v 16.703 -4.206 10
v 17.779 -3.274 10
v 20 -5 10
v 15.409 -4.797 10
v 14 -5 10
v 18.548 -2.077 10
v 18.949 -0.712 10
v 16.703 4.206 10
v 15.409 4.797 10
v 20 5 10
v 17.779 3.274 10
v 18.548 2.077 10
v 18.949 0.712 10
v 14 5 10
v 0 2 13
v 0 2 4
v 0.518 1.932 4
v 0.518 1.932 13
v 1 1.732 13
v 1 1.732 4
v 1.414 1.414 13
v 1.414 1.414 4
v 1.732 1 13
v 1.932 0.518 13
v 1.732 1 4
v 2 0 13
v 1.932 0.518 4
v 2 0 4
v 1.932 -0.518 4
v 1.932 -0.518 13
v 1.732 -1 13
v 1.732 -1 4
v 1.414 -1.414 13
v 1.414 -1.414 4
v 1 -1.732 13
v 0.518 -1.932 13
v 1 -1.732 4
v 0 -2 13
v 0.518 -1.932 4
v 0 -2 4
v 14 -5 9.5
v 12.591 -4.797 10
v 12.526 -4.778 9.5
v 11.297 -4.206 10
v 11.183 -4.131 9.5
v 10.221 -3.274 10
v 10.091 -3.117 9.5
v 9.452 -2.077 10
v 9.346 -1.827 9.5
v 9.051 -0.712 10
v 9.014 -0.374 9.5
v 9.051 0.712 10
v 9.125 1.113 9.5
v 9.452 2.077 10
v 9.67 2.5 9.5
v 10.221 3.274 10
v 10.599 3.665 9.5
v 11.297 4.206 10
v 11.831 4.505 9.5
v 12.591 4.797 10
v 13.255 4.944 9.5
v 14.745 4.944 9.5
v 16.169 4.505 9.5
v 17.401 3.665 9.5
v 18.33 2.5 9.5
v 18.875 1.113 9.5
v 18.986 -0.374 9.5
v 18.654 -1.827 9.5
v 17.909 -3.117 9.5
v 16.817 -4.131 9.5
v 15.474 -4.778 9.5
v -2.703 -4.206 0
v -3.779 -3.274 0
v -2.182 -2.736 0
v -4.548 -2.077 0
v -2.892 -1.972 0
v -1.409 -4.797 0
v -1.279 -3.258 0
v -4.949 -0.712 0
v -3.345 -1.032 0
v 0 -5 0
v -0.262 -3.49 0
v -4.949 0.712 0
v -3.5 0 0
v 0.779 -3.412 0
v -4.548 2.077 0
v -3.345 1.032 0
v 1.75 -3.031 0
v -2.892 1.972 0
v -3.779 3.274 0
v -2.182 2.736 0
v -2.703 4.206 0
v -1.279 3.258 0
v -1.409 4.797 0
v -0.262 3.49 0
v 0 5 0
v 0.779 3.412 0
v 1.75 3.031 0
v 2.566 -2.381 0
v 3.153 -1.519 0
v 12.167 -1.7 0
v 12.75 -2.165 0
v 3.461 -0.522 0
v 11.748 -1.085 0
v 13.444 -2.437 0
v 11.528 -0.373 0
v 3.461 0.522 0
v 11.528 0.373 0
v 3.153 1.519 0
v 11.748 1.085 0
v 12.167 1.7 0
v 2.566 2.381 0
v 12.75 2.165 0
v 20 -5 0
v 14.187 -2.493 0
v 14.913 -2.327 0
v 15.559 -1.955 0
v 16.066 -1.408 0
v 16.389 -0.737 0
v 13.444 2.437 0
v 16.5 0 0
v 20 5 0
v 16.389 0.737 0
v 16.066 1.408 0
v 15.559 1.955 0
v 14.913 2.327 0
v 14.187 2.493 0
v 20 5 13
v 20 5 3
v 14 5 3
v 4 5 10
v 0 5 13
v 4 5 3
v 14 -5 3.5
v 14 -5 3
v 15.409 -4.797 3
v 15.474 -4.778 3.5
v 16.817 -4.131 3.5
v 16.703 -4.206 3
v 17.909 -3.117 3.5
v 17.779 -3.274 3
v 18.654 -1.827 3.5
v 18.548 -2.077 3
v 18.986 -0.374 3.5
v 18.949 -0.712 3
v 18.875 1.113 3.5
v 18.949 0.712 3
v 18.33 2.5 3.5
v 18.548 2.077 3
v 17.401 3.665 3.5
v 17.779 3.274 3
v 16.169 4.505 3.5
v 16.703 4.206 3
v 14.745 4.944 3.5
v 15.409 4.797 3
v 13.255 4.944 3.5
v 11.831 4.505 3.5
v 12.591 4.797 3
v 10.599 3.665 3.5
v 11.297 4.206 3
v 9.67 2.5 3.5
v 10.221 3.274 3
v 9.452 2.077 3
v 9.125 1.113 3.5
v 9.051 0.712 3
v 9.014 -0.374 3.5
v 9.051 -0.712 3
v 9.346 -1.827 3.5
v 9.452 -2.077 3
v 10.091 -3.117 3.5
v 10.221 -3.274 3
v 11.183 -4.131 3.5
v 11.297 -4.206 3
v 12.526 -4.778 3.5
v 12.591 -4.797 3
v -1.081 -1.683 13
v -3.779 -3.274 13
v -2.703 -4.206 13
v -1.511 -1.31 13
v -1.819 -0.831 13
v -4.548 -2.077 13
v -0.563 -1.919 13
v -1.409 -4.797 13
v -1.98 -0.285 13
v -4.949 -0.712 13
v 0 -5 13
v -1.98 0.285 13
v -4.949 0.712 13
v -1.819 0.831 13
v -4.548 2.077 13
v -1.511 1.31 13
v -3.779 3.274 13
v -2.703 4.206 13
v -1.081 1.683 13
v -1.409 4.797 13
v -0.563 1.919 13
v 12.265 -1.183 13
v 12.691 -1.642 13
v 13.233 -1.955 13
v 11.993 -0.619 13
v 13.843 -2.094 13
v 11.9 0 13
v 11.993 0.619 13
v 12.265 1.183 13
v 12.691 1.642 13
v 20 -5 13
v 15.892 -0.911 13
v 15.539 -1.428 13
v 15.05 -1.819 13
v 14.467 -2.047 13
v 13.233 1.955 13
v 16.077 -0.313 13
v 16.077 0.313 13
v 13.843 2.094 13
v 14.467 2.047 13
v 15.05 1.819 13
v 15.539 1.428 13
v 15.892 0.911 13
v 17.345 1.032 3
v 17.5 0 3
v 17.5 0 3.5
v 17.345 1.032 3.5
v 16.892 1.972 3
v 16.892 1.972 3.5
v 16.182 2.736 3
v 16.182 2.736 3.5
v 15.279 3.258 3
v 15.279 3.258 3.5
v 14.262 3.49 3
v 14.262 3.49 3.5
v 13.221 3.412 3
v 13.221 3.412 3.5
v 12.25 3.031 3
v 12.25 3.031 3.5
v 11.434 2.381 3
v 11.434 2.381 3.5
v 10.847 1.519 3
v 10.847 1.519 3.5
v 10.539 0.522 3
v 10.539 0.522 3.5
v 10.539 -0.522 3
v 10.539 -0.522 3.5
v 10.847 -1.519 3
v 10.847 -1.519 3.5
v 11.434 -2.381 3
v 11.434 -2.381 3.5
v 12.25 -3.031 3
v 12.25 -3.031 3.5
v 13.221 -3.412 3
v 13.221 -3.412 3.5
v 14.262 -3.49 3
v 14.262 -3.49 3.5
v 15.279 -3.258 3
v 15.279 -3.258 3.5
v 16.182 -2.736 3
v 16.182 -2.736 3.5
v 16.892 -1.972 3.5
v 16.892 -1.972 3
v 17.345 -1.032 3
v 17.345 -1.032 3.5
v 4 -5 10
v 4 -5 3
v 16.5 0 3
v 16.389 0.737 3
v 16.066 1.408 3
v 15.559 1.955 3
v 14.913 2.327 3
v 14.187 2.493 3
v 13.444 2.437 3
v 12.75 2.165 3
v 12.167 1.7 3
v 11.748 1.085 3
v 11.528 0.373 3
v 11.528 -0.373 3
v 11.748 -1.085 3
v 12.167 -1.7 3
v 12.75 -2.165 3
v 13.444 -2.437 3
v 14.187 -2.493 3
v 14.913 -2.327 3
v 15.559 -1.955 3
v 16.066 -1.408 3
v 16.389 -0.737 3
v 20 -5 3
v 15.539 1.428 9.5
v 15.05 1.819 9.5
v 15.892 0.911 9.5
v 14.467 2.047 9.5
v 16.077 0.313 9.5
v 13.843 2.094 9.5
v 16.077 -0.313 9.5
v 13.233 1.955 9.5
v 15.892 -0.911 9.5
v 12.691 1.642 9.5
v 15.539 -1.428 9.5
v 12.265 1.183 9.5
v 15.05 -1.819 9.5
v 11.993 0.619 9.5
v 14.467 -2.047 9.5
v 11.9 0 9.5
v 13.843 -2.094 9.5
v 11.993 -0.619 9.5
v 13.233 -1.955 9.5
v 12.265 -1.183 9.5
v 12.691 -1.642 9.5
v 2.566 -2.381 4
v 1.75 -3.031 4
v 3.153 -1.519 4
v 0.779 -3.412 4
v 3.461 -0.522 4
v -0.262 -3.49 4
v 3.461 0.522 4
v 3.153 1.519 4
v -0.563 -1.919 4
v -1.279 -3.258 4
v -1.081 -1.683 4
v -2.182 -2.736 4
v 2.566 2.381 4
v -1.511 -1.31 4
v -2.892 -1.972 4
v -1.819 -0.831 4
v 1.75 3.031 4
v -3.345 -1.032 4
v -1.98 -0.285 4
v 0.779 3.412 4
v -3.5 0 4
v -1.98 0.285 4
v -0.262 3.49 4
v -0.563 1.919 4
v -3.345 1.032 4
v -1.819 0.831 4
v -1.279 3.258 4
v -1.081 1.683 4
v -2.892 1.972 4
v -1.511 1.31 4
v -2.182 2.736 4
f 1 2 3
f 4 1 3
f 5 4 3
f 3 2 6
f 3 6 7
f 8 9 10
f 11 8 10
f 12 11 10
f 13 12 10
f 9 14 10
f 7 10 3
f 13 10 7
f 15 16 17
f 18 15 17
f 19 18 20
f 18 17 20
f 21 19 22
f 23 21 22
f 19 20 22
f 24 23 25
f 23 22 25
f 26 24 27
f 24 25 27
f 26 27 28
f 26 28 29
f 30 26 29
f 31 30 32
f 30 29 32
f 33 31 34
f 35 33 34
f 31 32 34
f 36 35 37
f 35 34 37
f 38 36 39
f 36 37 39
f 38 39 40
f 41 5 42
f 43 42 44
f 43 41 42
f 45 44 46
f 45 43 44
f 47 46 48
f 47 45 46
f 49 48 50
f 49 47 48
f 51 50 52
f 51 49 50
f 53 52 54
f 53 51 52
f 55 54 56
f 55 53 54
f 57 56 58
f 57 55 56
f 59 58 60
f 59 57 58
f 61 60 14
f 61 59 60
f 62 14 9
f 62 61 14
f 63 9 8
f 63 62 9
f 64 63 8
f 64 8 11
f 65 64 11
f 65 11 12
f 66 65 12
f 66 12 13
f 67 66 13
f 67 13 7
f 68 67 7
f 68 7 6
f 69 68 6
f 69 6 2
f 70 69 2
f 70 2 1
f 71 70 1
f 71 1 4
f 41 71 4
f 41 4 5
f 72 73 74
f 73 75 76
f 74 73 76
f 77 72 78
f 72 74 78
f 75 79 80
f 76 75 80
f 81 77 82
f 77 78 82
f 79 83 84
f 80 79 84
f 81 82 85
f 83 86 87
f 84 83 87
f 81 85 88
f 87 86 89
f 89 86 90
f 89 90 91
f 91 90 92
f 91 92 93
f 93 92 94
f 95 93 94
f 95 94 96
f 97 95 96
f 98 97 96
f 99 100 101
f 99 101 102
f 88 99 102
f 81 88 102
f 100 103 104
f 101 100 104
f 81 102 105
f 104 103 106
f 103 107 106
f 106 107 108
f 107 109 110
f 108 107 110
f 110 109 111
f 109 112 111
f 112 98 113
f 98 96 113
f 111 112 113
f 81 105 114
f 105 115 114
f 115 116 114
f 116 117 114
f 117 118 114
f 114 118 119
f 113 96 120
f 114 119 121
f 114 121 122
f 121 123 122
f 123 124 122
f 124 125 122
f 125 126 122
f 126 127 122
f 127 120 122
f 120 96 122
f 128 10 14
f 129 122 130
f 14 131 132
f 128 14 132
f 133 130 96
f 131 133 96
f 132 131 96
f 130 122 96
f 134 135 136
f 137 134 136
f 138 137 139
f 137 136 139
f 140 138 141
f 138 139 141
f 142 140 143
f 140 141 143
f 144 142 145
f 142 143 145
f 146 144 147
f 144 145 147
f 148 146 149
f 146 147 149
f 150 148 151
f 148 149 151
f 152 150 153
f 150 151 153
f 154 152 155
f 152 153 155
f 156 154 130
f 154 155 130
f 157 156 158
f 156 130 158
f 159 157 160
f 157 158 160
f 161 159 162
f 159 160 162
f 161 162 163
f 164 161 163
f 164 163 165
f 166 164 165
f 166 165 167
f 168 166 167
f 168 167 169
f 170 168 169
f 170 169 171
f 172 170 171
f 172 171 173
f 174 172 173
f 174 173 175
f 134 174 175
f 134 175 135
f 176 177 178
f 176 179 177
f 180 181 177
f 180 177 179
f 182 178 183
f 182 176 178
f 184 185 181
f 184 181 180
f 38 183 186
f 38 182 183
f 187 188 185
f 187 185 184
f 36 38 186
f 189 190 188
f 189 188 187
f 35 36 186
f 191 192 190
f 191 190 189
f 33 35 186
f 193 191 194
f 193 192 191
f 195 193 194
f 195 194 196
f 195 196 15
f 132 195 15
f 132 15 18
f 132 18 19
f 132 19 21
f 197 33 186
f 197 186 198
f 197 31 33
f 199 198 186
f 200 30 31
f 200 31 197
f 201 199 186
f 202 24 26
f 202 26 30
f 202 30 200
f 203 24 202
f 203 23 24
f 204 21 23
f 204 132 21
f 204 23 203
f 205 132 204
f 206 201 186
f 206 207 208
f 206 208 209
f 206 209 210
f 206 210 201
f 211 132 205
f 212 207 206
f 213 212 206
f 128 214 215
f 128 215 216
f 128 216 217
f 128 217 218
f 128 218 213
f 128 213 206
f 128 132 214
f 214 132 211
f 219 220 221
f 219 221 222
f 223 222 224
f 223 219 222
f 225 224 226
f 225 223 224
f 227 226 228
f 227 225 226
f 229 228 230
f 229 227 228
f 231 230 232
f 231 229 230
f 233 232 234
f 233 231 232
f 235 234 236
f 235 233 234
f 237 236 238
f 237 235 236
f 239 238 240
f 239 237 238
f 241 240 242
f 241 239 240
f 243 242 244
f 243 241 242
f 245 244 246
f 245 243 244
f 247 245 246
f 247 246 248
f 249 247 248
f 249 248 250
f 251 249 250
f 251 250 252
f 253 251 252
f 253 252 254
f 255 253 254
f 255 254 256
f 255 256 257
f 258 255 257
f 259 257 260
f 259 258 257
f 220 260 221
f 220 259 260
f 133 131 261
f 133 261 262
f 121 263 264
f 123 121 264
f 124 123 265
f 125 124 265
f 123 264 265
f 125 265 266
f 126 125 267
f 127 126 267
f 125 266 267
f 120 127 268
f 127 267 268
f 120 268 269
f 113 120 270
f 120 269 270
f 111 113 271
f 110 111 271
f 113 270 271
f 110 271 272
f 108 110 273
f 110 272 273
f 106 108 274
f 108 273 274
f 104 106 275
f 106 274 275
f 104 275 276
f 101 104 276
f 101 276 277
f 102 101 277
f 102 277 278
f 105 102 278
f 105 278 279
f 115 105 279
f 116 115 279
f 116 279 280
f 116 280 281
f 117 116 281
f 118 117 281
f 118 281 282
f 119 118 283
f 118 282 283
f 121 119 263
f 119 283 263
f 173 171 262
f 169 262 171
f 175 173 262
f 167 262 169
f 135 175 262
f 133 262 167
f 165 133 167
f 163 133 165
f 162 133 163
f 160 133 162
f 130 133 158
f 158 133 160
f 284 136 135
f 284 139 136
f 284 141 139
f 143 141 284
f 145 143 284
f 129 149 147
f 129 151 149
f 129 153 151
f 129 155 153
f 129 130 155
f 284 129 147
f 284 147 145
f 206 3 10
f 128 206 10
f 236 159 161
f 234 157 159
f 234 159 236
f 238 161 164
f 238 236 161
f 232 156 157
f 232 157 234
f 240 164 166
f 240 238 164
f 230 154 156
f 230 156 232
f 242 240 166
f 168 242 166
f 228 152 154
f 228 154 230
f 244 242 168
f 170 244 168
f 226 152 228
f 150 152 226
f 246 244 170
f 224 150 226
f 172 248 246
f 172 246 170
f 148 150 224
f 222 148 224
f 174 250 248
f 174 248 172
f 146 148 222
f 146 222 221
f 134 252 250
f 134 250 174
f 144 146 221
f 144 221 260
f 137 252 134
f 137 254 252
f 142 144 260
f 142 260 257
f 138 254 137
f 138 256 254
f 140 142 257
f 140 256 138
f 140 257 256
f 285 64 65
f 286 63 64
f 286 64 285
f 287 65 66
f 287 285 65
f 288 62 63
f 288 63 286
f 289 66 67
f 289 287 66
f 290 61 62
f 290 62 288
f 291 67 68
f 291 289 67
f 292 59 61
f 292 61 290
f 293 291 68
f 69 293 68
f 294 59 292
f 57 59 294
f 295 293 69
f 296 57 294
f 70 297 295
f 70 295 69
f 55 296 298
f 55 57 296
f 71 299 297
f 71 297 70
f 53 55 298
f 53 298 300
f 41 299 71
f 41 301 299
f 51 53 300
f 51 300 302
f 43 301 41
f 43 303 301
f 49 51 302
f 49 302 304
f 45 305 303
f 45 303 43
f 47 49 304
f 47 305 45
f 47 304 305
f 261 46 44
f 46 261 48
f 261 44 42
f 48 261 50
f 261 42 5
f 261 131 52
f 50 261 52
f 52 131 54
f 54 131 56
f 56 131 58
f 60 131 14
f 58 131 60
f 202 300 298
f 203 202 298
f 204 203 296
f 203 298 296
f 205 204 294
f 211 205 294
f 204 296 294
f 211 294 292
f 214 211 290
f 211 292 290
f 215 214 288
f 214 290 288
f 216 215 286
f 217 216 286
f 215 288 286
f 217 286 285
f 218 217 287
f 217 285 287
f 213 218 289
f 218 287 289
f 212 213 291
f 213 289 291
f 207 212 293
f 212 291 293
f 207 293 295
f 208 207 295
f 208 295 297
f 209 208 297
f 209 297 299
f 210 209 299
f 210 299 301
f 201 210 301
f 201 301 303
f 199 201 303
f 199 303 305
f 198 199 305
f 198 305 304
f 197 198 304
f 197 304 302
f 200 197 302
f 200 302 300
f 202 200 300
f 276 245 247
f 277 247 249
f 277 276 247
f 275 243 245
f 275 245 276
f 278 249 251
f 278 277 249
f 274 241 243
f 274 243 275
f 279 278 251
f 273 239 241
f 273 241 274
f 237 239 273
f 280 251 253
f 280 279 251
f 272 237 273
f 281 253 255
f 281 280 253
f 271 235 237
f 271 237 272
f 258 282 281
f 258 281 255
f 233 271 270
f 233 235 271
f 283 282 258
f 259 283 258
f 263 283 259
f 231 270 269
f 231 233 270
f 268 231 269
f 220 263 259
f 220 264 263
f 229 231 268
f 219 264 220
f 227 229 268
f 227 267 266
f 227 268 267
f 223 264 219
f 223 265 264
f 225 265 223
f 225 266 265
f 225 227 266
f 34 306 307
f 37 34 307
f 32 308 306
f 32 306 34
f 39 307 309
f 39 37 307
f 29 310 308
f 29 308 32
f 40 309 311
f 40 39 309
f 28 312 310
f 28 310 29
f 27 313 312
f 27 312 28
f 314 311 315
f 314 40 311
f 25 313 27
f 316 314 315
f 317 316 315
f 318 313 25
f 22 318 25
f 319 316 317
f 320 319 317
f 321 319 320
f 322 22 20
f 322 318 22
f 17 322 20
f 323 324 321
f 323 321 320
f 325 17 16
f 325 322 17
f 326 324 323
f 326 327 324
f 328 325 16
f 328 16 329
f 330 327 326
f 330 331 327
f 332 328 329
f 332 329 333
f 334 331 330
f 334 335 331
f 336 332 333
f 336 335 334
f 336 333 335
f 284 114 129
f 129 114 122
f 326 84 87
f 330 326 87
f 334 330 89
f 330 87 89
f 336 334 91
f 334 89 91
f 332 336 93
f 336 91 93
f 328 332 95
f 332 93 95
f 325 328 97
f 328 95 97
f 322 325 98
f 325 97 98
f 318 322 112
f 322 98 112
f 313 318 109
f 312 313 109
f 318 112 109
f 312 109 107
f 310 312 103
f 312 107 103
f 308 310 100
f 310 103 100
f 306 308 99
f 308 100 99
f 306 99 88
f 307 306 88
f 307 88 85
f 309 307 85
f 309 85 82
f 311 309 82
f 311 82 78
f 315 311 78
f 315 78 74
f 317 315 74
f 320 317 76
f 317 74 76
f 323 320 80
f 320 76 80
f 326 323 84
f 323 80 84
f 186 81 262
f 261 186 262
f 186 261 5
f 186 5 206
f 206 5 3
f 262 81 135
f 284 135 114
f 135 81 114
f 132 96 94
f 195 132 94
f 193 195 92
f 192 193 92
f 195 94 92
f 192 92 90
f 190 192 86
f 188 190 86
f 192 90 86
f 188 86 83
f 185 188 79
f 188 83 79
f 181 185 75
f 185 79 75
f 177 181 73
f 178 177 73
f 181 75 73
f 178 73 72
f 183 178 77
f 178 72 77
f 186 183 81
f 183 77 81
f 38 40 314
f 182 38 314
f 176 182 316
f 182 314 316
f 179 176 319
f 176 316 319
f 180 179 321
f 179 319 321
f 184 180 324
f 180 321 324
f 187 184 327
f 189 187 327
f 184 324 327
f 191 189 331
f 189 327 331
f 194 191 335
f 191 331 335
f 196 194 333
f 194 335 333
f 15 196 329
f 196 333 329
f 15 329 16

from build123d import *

# Parameters (mm, degrees)
AUFSATZ_LINEAR_AUSTRAGEN1_DEPTH = 13
SKIZZE2_W                       = 16
SKIZZE2_H                       = 7
SCHNITT_LINEAR_AUSTRAGEN1_DEPTH = 10
SKIZZE4_R                       = 2.5
SCHNITT_LINEAR_AUSTRAGEN2_DEPTH = 3
SKIZZE5_R                       = 3.5
SKIZZE5_R_2                     = 2
SCHNITT_LINEAR_AUSTRAGEN3_DEPTH = 4
SKIZZE6_R                       = 2.1
SCHNITT_LINEAR_AUSTRAGEN4_DEPTH = 4
SKIZZE7_R                       = 5
SKIZZE7_R_2                     = 3.5
AUFSATZ_LINEAR_AUSTRAGEN2_DEPTH = 0.5
AUFSATZ_LINEAR_START            = 0.5
SKIZZE8_R                       = 5
SKIZZE8_R_2                     = 2.1
AUFSATZ_LINEAR_AUSTRAGEN3_DEPTH = 0.5


with BuildPart() as part:
    # Skizze1 → Aufsatz-Linear austragen1 (new body)
    with BuildSketch(Plane.XY):
        with BuildLine():
            ThreePointArc((5, 0), (3.535533906, 3.535533906), (0, 5))
            Line((0, 5), (0, 2))
            ThreePointArc((0, 2), (1.414213562, 1.414213562), (2, 0))
            ThreePointArc((2, 0), (1.414213562, -1.414213562), (0, -2))
            Line((0, -2), (0, -5))
            ThreePointArc((0, -5), (3.535533906, -3.535533906), (5, 0))
        make_face()
        with BuildLine():
            Line((0, 2), (0, 5))
            ThreePointArc((0, 5), (-5, 0), (0, -5))
            Line((0, -5), (0, -2))
            ThreePointArc((0, -2), (-2, 0), (0, 2))
        make_face()
        with BuildLine():
            Line((20, 5), (0, 5))
            ThreePointArc((0, 5), (3.535533906, 3.535533906), (5, 0))
            ThreePointArc((5, 0), (3.535533906, -3.535533906), (0, -5))
            Line((0, -5), (20, -5))
            Line((20, -5), (20, 5))
        make_face()
    extrude(amount=AUFSATZ_LINEAR_AUSTRAGEN1_DEPTH)

    # Skizze2 → Schnitt-Linear austragen1 (cut)
    with BuildSketch(Plane(origin=(0, 5, 0), x_dir=(1, 0, 0), z_dir=(0, 1, 0))):
        with Locations((12, -6.5)):
            Rectangle(SKIZZE2_W, SKIZZE2_H)
    extrude(amount=-SCHNITT_LINEAR_AUSTRAGEN1_DEPTH, mode=Mode.SUBTRACT)

    # Skizze4 → Schnitt-Linear austragen2 (cut)
    with BuildSketch(Plane.XY.offset(3)):
        with Locations((14, 0)):
            Circle(SKIZZE4_R)
    extrude(amount=-SCHNITT_LINEAR_AUSTRAGEN2_DEPTH, mode=Mode.SUBTRACT)

    # Skizze5 → Schnitt-Linear austragen3 (cut)
    with BuildSketch(Plane(origin=(0, 0, 0), x_dir=(-1, 0, 0), z_dir=(0, 0, -1))):
        Circle(SKIZZE5_R)
        Circle(SKIZZE5_R_2, mode=Mode.SUBTRACT)
    extrude(amount=-SCHNITT_LINEAR_AUSTRAGEN3_DEPTH, mode=Mode.SUBTRACT)

    # Skizze6 → Schnitt-Linear austragen4 (cut)
    with BuildSketch(Plane(origin=(0, 0, 10), x_dir=(-1, 0, 0), z_dir=(0, 0, -1))):
        with Locations((-14, 0)):
            Circle(SKIZZE6_R)
    extrude(amount=-SCHNITT_LINEAR_AUSTRAGEN4_DEPTH, mode=Mode.SUBTRACT)

    # Skizze7 → Aufsatz-Linear austragen2 (add)
    with BuildSketch(Plane.XY.offset(3)):
        with Locations(Location((14, 0, 0), (0, 0, 270))):
            Circle(SKIZZE7_R)
        with Locations((14, 0)):
            Circle(SKIZZE7_R_2, mode=Mode.SUBTRACT)
    extrude(amount=AUFSATZ_LINEAR_AUSTRAGEN2_DEPTH)

    # Skizze8 → Aufsatz-Linear austragen3 (add)
    with BuildSketch(Plane(origin=(0, 0, 10), x_dir=(-1, 0, 0), z_dir=(0, 0, -1)).offset(AUFSATZ_LINEAR_START)):
        with Locations(Location((-14, 0, 0), (0, 0, 270))):
            Circle(SKIZZE8_R)
        with Locations((-14, 0)):
            Circle(SKIZZE8_R_2, mode=Mode.SUBTRACT)
    extrude(amount=-AUFSATZ_LINEAR_AUSTRAGEN3_DEPTH)


solid = part.part
